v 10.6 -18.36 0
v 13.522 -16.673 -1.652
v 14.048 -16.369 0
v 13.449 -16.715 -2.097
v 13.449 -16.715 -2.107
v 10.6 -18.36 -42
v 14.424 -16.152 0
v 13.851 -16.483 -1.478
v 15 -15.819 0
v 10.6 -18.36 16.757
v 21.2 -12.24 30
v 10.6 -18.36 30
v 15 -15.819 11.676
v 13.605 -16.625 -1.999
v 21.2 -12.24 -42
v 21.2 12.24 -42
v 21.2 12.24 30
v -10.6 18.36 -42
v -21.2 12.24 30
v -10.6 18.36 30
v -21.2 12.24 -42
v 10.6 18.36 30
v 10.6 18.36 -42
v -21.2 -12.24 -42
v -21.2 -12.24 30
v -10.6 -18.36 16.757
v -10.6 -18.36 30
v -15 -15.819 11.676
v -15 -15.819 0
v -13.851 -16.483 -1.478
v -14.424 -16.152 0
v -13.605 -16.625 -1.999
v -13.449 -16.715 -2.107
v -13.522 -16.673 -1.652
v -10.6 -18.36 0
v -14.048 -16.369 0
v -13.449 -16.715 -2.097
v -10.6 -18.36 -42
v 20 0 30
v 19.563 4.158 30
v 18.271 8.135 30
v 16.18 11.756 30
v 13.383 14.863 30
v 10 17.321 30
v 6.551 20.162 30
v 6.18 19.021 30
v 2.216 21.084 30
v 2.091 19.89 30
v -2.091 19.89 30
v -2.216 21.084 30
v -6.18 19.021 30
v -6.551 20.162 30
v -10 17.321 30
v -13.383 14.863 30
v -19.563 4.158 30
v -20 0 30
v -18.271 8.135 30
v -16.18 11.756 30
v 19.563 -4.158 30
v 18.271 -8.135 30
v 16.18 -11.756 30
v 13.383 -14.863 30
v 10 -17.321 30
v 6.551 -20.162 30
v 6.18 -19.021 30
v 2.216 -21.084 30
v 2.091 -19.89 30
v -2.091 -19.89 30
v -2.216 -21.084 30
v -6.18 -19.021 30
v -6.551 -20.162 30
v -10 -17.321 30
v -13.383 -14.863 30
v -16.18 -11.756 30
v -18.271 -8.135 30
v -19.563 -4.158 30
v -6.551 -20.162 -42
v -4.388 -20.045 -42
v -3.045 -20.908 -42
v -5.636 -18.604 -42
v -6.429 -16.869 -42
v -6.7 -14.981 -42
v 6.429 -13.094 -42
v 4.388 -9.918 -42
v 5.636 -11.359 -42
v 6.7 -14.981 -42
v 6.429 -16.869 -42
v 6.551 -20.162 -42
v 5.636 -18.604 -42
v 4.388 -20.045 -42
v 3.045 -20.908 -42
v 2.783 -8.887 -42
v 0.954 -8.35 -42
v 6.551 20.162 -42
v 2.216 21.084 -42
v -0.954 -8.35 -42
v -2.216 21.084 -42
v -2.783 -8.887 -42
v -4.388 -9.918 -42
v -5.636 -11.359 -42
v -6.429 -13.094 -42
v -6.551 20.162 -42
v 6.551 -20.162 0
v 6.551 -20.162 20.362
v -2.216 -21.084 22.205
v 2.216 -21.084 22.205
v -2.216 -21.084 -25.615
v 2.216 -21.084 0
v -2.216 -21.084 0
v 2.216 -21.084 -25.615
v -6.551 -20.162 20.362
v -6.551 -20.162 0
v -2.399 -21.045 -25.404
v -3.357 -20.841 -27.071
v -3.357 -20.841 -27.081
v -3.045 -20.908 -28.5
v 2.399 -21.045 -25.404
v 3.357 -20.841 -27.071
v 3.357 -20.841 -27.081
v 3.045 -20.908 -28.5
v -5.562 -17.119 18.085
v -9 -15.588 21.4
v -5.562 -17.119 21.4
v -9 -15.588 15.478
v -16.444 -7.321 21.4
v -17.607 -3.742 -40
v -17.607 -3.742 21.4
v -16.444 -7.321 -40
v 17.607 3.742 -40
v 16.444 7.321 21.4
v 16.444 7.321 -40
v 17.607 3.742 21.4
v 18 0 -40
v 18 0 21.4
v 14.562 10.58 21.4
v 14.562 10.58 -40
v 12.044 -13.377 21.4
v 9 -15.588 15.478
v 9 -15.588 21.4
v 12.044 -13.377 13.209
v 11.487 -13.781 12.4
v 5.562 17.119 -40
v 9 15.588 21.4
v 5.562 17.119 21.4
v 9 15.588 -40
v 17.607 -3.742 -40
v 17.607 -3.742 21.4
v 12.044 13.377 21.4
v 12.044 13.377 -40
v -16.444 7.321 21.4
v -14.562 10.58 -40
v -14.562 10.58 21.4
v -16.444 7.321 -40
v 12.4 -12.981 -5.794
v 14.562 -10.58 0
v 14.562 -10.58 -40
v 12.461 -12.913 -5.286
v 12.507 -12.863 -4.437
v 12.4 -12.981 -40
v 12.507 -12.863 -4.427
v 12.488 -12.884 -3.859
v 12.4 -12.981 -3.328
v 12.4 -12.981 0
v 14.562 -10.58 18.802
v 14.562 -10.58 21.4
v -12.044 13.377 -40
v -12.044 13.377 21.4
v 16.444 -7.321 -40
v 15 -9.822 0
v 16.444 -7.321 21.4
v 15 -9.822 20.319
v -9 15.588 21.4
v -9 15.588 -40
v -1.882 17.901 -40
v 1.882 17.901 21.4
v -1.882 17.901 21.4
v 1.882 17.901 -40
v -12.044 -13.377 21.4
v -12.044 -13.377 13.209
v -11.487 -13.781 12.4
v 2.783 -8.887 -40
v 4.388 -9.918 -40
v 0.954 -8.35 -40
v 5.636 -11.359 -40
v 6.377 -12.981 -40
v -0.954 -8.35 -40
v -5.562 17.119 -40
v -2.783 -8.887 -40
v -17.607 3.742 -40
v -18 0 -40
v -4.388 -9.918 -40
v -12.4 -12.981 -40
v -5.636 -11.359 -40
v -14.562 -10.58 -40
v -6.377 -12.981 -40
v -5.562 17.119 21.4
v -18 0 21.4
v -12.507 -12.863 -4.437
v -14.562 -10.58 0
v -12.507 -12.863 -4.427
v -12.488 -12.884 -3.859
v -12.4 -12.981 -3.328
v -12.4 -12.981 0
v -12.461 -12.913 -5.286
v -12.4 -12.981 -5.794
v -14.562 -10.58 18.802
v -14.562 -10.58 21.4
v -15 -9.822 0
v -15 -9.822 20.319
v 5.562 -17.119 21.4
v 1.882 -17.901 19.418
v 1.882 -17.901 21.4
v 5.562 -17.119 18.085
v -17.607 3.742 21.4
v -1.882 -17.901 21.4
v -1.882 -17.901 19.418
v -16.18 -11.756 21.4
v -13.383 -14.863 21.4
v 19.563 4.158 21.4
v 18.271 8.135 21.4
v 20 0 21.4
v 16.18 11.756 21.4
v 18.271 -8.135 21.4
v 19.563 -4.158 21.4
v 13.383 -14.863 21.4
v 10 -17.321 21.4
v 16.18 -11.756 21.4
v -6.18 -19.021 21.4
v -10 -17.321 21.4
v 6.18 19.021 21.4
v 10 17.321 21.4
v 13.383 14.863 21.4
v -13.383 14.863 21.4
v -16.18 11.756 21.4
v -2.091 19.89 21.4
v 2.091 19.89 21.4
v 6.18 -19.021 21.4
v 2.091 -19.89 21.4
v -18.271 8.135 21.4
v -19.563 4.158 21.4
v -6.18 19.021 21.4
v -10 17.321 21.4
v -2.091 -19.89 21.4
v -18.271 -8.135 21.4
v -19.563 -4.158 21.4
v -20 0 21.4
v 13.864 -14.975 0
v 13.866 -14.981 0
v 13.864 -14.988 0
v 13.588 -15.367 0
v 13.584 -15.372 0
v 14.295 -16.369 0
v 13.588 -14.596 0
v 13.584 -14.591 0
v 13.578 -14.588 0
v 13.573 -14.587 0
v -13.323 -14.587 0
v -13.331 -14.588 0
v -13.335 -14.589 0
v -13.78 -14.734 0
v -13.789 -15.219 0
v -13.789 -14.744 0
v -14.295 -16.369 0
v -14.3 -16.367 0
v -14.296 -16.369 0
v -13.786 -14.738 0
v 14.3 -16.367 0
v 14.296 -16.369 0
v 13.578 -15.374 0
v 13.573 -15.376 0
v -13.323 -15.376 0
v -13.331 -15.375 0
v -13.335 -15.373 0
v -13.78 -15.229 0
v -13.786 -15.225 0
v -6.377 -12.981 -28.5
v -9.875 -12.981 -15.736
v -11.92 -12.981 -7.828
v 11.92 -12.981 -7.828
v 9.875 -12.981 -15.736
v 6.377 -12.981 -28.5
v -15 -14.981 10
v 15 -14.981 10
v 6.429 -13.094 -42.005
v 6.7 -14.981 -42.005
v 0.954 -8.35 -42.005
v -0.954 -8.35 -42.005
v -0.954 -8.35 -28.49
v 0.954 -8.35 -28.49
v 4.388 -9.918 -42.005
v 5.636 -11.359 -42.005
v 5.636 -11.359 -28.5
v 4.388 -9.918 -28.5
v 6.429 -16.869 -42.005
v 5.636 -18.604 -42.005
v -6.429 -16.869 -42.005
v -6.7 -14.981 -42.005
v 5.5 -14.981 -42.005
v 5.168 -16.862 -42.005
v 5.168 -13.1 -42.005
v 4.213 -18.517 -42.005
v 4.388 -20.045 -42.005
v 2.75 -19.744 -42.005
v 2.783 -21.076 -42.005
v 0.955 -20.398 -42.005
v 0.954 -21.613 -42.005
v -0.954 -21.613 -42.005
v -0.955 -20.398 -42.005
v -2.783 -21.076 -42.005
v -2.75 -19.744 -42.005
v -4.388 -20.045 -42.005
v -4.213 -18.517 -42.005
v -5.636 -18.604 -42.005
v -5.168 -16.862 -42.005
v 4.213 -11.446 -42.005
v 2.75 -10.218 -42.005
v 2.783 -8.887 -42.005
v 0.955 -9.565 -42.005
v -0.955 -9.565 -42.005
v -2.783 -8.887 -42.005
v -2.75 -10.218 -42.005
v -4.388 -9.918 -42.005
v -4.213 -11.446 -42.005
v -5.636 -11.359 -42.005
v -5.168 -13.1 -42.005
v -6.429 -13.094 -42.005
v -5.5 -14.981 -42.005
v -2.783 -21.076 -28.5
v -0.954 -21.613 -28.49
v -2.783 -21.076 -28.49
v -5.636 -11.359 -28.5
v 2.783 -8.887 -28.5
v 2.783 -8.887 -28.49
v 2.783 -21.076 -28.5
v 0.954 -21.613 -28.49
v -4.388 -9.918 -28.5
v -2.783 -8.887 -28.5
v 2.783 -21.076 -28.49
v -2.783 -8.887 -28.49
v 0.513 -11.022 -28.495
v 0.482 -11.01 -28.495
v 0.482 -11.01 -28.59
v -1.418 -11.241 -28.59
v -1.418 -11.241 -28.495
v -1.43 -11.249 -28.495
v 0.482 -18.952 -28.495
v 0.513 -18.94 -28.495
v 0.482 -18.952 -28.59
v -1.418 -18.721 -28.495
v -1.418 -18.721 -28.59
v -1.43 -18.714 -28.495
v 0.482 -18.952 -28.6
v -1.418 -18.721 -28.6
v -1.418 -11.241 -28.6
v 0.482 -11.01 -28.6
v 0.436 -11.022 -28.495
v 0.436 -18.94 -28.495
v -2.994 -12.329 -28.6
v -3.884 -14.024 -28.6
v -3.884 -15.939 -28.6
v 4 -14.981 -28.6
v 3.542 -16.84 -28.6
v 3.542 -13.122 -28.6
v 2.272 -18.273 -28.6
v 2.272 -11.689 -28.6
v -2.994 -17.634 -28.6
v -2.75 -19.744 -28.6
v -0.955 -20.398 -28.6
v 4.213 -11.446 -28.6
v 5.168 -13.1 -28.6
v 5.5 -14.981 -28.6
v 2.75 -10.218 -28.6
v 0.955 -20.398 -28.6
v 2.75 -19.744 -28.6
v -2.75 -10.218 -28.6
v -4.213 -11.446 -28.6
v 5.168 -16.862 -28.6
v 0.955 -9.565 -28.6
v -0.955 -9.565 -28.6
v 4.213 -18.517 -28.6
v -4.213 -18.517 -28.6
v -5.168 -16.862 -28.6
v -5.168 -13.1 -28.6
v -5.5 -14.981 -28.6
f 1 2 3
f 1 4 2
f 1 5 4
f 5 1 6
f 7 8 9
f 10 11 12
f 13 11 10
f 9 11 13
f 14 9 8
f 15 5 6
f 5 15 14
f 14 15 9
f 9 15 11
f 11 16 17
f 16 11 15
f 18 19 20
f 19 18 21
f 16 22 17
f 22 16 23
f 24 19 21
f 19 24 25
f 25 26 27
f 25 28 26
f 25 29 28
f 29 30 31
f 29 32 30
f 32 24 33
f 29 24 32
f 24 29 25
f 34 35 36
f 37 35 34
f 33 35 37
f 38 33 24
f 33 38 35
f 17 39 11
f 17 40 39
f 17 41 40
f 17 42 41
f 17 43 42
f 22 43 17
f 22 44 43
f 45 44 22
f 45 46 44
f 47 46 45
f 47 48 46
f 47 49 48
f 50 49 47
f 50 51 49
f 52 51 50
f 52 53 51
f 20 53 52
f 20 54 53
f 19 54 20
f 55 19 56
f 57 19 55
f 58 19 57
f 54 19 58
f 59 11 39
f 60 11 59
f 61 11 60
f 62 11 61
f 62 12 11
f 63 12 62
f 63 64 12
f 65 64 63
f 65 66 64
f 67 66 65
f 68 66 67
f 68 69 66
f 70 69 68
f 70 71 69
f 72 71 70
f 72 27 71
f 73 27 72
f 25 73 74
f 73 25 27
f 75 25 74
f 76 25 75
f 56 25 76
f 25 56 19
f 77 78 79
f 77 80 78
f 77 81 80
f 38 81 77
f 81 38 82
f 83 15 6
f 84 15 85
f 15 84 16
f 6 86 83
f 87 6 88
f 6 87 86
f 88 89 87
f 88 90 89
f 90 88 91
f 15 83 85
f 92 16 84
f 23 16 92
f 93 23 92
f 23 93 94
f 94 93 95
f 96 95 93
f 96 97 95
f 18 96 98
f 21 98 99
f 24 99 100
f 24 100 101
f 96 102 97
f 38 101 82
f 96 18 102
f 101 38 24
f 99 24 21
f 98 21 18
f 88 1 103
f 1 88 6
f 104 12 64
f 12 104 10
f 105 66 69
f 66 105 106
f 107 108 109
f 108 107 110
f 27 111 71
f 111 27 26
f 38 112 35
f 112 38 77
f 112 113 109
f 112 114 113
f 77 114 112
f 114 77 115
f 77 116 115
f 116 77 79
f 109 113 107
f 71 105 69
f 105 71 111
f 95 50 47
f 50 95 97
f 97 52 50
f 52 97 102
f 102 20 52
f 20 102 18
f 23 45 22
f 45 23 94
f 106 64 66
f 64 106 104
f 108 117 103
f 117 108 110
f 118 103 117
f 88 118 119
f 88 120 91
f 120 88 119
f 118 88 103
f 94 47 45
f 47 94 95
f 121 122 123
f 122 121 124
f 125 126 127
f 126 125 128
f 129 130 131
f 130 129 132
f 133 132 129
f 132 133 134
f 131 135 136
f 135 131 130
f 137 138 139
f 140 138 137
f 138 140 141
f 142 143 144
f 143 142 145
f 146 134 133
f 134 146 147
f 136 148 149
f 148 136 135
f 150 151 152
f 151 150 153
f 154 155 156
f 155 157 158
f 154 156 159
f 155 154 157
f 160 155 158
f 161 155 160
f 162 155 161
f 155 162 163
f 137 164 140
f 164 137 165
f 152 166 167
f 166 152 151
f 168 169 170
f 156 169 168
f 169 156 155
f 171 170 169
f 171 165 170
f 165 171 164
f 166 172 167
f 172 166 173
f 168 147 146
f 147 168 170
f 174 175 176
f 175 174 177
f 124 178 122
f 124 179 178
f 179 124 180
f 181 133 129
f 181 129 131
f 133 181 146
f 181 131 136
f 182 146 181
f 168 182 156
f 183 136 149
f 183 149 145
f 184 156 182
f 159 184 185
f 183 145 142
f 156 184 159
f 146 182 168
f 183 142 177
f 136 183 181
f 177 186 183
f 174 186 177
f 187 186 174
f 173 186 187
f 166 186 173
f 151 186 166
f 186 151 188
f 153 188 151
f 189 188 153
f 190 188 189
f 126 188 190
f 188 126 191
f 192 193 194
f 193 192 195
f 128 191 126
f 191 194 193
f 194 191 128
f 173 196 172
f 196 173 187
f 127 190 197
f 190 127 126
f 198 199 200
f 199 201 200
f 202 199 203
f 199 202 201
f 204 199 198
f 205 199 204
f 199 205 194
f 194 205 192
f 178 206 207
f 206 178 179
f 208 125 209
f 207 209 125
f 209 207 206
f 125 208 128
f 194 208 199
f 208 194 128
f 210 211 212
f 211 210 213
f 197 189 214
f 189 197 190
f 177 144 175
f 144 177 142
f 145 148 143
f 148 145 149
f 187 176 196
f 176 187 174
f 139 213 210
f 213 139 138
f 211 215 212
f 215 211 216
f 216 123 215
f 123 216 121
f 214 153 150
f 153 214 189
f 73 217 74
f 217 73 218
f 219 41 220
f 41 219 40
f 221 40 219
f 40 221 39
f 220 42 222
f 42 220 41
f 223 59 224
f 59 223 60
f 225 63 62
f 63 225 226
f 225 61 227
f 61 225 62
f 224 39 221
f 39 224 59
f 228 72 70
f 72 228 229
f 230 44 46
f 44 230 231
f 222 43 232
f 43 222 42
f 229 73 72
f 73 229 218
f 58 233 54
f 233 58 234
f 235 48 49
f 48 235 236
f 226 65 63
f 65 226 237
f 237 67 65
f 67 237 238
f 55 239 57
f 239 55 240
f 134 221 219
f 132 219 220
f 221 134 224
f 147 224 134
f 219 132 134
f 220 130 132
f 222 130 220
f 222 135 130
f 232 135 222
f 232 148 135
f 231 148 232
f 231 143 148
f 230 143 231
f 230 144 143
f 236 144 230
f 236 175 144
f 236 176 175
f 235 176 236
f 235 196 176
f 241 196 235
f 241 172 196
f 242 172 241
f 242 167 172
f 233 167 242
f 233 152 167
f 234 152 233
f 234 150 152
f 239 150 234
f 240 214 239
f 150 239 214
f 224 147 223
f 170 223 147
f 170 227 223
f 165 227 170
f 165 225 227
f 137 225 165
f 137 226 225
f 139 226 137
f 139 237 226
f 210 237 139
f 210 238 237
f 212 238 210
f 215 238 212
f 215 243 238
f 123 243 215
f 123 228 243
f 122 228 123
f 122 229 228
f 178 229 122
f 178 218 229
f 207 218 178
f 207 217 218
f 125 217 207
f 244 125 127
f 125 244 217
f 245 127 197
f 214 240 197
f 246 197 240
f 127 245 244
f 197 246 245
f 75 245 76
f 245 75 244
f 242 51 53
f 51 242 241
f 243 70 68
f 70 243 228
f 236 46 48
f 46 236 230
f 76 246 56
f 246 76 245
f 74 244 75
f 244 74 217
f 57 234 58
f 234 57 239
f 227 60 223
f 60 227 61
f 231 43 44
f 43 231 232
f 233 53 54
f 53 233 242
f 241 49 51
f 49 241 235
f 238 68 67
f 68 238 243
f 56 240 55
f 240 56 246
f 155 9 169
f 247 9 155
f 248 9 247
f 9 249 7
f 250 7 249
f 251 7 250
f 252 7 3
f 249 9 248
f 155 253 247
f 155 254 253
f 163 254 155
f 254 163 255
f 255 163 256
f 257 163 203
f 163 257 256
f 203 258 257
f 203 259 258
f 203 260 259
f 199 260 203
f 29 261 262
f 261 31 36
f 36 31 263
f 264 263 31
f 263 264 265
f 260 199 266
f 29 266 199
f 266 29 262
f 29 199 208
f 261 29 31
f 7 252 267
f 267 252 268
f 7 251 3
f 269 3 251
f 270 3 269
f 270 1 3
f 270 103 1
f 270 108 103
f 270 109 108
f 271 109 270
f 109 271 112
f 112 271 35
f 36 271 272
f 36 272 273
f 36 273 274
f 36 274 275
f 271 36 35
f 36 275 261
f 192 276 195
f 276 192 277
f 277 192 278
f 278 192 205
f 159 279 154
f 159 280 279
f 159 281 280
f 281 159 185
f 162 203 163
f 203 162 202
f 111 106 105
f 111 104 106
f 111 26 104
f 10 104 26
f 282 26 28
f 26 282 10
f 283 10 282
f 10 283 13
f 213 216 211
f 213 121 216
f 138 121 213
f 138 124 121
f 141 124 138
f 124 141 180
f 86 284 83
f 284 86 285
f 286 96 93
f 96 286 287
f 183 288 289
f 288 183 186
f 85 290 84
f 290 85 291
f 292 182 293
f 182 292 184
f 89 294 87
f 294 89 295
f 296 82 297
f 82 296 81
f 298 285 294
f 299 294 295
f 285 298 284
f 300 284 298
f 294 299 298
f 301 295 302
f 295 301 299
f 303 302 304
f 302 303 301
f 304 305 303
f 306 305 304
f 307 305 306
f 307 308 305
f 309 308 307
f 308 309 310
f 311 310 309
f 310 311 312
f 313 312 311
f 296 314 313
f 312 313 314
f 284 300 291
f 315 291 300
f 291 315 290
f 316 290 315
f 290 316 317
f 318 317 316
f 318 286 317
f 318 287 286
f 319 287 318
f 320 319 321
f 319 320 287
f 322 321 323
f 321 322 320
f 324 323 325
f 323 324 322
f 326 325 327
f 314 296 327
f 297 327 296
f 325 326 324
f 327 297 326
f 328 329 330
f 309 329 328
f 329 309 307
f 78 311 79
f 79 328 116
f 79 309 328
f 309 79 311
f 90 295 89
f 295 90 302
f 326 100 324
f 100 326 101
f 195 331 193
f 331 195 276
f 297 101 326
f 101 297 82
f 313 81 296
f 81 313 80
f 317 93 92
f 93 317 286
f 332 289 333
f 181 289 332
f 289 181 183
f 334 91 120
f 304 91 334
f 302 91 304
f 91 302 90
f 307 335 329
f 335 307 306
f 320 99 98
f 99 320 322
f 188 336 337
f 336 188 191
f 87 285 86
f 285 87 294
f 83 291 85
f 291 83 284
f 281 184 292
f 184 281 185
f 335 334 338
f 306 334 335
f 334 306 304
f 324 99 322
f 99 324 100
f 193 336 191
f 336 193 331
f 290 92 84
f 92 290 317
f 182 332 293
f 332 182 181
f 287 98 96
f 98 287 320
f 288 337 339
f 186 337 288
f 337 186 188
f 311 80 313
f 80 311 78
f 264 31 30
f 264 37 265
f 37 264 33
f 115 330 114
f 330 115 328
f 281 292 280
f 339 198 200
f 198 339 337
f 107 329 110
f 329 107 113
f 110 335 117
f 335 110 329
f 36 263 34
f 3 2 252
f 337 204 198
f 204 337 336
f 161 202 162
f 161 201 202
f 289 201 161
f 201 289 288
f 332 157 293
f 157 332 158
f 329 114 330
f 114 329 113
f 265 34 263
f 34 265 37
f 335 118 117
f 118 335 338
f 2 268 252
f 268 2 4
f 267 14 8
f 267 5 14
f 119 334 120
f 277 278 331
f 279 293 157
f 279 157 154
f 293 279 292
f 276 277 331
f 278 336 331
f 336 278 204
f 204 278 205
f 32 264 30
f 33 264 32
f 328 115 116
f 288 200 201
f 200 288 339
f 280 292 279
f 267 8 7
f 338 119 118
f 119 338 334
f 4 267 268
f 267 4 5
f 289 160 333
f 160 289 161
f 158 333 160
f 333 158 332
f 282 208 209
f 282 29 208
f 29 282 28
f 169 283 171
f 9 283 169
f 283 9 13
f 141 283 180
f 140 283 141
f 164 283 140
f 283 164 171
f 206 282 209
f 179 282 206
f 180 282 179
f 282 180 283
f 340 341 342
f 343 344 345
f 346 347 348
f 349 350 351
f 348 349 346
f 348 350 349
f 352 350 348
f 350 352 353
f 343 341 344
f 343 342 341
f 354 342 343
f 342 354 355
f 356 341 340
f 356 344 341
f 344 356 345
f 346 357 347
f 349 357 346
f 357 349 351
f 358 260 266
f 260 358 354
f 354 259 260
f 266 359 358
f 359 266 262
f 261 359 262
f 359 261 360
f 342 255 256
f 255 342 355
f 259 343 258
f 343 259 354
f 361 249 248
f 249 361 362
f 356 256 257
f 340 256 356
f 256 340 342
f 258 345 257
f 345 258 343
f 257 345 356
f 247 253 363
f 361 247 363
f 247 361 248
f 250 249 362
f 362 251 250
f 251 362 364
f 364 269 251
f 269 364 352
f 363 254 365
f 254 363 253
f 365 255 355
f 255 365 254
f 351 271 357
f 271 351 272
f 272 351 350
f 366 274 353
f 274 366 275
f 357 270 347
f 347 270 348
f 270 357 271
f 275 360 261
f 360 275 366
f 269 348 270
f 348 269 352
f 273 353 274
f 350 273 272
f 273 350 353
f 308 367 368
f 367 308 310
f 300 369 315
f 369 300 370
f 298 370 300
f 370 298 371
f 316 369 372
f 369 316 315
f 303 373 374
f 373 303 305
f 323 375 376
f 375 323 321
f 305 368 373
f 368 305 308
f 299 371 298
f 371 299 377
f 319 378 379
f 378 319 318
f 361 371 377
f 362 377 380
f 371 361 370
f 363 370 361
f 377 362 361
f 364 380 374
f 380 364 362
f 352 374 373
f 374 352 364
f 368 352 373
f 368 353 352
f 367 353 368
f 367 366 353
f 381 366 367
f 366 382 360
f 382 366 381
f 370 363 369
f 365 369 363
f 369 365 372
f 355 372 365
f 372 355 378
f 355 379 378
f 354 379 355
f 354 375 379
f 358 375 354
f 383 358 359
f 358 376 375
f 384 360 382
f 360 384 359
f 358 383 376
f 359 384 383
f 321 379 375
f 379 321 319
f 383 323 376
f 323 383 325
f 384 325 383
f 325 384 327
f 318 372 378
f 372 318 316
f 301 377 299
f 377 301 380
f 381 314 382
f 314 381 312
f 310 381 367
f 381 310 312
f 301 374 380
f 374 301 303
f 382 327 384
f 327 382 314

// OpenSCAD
// file: OpenSCAD_support/straight_flue.scad
// straight loft and accesoires 

module curvedFlueLoft(upperDiameter, lowerDiameter, loftCeiling, loftFloor){
    union(){
        // tube
        hull(){
        	translate([0, airSupplyY, loftFloor]) 
                cylinder(h=0.01, d=lowerDiameter, center=true);
        	translate([0, airSupplyY, (ground + tubeInsert)])
                cylinder(h=0.01, d=lowerDiameter, center=true);
        }
        // straight flue
            hull(){
            translate ([labiumWidth*-0.45, airSupplyY, loftCeiling]) 
                cylinder (0.01, d=upperDiameter);
            translate ([labiumWidth*0.45, airSupplyY, loftCeiling]) 
                cylinder (0.01, d=upperDiameter);
            translate ([0, airSupplyY, (loftFloor + tubeInsert)]) 
                cylinder (0.01, d=lowerDiameter);
        };
    };
}

module outer_straight_flue(){
    curvedFlueLoft(    
        upperDiameter = (flueWidth + 2 * minWallThickness), 
        lowerDiameter = (outerTube + 2 * minWallThickness),
        loftCeiling = 0,
        loftFloor = ground
    );
}

module inner_straight_flue(){
    curvedFlueLoft(
        upperDiameter = flueWidth, 
        lowerDiameter = innerTube, 
        loftCeiling = 0.1, 
        loftFloor = (ground-0.1)
    ); 
}

module straight_flue_fill(){
    translate ([0, 0, ground])
        intersection(){
            cylinder(height, d=(outerDiameter + 2* minWallThickness));
            translate([labiumWidth*-0.5, airSupplyY - outerDiameter + minWallThickness + flueWidth, 0])
                cube([labiumWidth, outerDiameter, floorThickness + lengthFlue]);
        }   
}
// file: OpenSCAD_support/straight_labium.scad
// straight labium cut and accesoires

module straight_labium_cut(){
    intersection(){
        translate ([-labiumWidth/2,0,0])
            rotate([90, 0, 90])
                linear_extrude(labiumWidth, $fn=50) 
                    polygon(points = labium_polygon_points);
        translate([labiumWidth*-0.25, 2*airSupplyY - labiumWidth*0.25, 0]) 
            minkowski(){
                cube([labiumWidth/2, -2*airSupplyY, -2*airSupplyY]);
                cylinder(r=labiumWidth/4,h=-2*airSupplyY);
            }
    }
};

module straight_labium_fill(){
    intersection(){
        translate ([-labiumWidth/2,0,0])
            rotate([90, 0, 90])
                linear_extrude(labiumWidth, $fn=50) 
                    polygon(points = labium_plus_points);
        cylinder(outerDiameter/2, d=outerDiameter);
    }
}
// file: OpenSCAD_support/common.scad
module basicShape(height)
translate ([0, 0, ground]) union(){
    difference(){
	   	union(){
	        intersection(){
	            rotate ([0, 0, 30]) 
                    cylinder_outer(height, (outerDiameter*0.5+minWallThickness), 6);
	            translate ([0,0,(height/2)]) 
                    cube ([outerDiameter*2, (sqrt(3)*(outerDiameter*0.5+minWallThickness)), height], center = true);
	 	    };
	        cylinder(height, d=(outerDiameter + 2* minWallThickness)); 
	   	};
        union(){
        	translate ([0, 0, floorThickness]) 
                cylinder(height, d=innerDiameter, center=false);
        	translate ([0, 0, (height - pipeInsert)]) 
                cylinder(height, d=outerDiameter, center=false);
        };
    };
};

module cylinder_outer(height,radius,fn){  	//from https://en.wikibooks.org/wiki/OpenSCAD_User_Manual/undersized_circular_objects
   fudge = 1/cos(180/fn);
   cylinder(h=height,r=radius*fudge,$fn=fn);
}
   
module airSupplySpacer(){
    translate ([0, airSupplyY, (ground-0.1)]) 
    cylinder (tubeInsert, d=outerTube, center=false);
}
// main file
// flue pippe. work in progress.

include <OpenSCAD_support/common.scad>
include <OpenSCAD_support/straight_labium.scad>
include <OpenSCAD_support/straight_flue.scad>

// variables
outerDiameter = 40;
innerDiameter = 36;
labiumWidth = 30;
outCut = 10;
lengthFlue = 40; // coordinate this with the frequency
outerTube = 11;
innerTube = 8;
minWallThickness = 1.2;
floorThickness = 2;
flueWidth = 0.8;

// proportions, are most likely good like that
tubeInsert = outerTube + 2.5;       // length
pipeInsert = innerDiameter * 0.1 + 5; // length
height = floorThickness
    + lengthFlue
    + outCut 
    + outerDiameter *0.5; 
    
// calculations, don't touch in production use
labium_angle = labiumWidth * 360 / outerDiameter / PI;
ground = (lengthFlue + floorThickness)*-1;
soundingLength = height - pipeInsert - floorThickness;
airSupplyY = sqrt((outerDiameter+2*minWallThickness)*(outerDiameter+2*minWallThickness) - labiumWidth*labiumWidth)/-2;
labium_polygon_points = 
    [[0,0],
    [0, outCut - 2*airSupplyY],
    [airSupplyY, outCut],
    [2*airSupplyY, outCut - 2*airSupplyY],
    [2*airSupplyY,0]];
labium_plus_points = 
    [[2*airSupplyY, outCut - 2*airSupplyY],
    [airSupplyY + minWallThickness, outCut + 2*minWallThickness],
    [airSupplyY, outCut],];


// announcing sounding length
echo(str("the sounding length inside the model in mm: ", soundingLength));

// flueLength warning
if (lengthFlue < outerTube * 2)
    echo("lengthFlue is too short");

// labium width warning
if (labium_angle < 60)
    echo("regarding the labium width, you have the right file");
if (labium_angle > 60)
    echo("use wide labium file");

// logic
difference(){
    union(){
        basicShape(height); 
        straight_flue_fill();
        straight_labium_fill();
        outer_straight_flue();
    };
    union(){
        straight_labium_cut();
        inner_straight_flue(); 
        airSupplySpacer();
    };
};
  

echo(version = version());
